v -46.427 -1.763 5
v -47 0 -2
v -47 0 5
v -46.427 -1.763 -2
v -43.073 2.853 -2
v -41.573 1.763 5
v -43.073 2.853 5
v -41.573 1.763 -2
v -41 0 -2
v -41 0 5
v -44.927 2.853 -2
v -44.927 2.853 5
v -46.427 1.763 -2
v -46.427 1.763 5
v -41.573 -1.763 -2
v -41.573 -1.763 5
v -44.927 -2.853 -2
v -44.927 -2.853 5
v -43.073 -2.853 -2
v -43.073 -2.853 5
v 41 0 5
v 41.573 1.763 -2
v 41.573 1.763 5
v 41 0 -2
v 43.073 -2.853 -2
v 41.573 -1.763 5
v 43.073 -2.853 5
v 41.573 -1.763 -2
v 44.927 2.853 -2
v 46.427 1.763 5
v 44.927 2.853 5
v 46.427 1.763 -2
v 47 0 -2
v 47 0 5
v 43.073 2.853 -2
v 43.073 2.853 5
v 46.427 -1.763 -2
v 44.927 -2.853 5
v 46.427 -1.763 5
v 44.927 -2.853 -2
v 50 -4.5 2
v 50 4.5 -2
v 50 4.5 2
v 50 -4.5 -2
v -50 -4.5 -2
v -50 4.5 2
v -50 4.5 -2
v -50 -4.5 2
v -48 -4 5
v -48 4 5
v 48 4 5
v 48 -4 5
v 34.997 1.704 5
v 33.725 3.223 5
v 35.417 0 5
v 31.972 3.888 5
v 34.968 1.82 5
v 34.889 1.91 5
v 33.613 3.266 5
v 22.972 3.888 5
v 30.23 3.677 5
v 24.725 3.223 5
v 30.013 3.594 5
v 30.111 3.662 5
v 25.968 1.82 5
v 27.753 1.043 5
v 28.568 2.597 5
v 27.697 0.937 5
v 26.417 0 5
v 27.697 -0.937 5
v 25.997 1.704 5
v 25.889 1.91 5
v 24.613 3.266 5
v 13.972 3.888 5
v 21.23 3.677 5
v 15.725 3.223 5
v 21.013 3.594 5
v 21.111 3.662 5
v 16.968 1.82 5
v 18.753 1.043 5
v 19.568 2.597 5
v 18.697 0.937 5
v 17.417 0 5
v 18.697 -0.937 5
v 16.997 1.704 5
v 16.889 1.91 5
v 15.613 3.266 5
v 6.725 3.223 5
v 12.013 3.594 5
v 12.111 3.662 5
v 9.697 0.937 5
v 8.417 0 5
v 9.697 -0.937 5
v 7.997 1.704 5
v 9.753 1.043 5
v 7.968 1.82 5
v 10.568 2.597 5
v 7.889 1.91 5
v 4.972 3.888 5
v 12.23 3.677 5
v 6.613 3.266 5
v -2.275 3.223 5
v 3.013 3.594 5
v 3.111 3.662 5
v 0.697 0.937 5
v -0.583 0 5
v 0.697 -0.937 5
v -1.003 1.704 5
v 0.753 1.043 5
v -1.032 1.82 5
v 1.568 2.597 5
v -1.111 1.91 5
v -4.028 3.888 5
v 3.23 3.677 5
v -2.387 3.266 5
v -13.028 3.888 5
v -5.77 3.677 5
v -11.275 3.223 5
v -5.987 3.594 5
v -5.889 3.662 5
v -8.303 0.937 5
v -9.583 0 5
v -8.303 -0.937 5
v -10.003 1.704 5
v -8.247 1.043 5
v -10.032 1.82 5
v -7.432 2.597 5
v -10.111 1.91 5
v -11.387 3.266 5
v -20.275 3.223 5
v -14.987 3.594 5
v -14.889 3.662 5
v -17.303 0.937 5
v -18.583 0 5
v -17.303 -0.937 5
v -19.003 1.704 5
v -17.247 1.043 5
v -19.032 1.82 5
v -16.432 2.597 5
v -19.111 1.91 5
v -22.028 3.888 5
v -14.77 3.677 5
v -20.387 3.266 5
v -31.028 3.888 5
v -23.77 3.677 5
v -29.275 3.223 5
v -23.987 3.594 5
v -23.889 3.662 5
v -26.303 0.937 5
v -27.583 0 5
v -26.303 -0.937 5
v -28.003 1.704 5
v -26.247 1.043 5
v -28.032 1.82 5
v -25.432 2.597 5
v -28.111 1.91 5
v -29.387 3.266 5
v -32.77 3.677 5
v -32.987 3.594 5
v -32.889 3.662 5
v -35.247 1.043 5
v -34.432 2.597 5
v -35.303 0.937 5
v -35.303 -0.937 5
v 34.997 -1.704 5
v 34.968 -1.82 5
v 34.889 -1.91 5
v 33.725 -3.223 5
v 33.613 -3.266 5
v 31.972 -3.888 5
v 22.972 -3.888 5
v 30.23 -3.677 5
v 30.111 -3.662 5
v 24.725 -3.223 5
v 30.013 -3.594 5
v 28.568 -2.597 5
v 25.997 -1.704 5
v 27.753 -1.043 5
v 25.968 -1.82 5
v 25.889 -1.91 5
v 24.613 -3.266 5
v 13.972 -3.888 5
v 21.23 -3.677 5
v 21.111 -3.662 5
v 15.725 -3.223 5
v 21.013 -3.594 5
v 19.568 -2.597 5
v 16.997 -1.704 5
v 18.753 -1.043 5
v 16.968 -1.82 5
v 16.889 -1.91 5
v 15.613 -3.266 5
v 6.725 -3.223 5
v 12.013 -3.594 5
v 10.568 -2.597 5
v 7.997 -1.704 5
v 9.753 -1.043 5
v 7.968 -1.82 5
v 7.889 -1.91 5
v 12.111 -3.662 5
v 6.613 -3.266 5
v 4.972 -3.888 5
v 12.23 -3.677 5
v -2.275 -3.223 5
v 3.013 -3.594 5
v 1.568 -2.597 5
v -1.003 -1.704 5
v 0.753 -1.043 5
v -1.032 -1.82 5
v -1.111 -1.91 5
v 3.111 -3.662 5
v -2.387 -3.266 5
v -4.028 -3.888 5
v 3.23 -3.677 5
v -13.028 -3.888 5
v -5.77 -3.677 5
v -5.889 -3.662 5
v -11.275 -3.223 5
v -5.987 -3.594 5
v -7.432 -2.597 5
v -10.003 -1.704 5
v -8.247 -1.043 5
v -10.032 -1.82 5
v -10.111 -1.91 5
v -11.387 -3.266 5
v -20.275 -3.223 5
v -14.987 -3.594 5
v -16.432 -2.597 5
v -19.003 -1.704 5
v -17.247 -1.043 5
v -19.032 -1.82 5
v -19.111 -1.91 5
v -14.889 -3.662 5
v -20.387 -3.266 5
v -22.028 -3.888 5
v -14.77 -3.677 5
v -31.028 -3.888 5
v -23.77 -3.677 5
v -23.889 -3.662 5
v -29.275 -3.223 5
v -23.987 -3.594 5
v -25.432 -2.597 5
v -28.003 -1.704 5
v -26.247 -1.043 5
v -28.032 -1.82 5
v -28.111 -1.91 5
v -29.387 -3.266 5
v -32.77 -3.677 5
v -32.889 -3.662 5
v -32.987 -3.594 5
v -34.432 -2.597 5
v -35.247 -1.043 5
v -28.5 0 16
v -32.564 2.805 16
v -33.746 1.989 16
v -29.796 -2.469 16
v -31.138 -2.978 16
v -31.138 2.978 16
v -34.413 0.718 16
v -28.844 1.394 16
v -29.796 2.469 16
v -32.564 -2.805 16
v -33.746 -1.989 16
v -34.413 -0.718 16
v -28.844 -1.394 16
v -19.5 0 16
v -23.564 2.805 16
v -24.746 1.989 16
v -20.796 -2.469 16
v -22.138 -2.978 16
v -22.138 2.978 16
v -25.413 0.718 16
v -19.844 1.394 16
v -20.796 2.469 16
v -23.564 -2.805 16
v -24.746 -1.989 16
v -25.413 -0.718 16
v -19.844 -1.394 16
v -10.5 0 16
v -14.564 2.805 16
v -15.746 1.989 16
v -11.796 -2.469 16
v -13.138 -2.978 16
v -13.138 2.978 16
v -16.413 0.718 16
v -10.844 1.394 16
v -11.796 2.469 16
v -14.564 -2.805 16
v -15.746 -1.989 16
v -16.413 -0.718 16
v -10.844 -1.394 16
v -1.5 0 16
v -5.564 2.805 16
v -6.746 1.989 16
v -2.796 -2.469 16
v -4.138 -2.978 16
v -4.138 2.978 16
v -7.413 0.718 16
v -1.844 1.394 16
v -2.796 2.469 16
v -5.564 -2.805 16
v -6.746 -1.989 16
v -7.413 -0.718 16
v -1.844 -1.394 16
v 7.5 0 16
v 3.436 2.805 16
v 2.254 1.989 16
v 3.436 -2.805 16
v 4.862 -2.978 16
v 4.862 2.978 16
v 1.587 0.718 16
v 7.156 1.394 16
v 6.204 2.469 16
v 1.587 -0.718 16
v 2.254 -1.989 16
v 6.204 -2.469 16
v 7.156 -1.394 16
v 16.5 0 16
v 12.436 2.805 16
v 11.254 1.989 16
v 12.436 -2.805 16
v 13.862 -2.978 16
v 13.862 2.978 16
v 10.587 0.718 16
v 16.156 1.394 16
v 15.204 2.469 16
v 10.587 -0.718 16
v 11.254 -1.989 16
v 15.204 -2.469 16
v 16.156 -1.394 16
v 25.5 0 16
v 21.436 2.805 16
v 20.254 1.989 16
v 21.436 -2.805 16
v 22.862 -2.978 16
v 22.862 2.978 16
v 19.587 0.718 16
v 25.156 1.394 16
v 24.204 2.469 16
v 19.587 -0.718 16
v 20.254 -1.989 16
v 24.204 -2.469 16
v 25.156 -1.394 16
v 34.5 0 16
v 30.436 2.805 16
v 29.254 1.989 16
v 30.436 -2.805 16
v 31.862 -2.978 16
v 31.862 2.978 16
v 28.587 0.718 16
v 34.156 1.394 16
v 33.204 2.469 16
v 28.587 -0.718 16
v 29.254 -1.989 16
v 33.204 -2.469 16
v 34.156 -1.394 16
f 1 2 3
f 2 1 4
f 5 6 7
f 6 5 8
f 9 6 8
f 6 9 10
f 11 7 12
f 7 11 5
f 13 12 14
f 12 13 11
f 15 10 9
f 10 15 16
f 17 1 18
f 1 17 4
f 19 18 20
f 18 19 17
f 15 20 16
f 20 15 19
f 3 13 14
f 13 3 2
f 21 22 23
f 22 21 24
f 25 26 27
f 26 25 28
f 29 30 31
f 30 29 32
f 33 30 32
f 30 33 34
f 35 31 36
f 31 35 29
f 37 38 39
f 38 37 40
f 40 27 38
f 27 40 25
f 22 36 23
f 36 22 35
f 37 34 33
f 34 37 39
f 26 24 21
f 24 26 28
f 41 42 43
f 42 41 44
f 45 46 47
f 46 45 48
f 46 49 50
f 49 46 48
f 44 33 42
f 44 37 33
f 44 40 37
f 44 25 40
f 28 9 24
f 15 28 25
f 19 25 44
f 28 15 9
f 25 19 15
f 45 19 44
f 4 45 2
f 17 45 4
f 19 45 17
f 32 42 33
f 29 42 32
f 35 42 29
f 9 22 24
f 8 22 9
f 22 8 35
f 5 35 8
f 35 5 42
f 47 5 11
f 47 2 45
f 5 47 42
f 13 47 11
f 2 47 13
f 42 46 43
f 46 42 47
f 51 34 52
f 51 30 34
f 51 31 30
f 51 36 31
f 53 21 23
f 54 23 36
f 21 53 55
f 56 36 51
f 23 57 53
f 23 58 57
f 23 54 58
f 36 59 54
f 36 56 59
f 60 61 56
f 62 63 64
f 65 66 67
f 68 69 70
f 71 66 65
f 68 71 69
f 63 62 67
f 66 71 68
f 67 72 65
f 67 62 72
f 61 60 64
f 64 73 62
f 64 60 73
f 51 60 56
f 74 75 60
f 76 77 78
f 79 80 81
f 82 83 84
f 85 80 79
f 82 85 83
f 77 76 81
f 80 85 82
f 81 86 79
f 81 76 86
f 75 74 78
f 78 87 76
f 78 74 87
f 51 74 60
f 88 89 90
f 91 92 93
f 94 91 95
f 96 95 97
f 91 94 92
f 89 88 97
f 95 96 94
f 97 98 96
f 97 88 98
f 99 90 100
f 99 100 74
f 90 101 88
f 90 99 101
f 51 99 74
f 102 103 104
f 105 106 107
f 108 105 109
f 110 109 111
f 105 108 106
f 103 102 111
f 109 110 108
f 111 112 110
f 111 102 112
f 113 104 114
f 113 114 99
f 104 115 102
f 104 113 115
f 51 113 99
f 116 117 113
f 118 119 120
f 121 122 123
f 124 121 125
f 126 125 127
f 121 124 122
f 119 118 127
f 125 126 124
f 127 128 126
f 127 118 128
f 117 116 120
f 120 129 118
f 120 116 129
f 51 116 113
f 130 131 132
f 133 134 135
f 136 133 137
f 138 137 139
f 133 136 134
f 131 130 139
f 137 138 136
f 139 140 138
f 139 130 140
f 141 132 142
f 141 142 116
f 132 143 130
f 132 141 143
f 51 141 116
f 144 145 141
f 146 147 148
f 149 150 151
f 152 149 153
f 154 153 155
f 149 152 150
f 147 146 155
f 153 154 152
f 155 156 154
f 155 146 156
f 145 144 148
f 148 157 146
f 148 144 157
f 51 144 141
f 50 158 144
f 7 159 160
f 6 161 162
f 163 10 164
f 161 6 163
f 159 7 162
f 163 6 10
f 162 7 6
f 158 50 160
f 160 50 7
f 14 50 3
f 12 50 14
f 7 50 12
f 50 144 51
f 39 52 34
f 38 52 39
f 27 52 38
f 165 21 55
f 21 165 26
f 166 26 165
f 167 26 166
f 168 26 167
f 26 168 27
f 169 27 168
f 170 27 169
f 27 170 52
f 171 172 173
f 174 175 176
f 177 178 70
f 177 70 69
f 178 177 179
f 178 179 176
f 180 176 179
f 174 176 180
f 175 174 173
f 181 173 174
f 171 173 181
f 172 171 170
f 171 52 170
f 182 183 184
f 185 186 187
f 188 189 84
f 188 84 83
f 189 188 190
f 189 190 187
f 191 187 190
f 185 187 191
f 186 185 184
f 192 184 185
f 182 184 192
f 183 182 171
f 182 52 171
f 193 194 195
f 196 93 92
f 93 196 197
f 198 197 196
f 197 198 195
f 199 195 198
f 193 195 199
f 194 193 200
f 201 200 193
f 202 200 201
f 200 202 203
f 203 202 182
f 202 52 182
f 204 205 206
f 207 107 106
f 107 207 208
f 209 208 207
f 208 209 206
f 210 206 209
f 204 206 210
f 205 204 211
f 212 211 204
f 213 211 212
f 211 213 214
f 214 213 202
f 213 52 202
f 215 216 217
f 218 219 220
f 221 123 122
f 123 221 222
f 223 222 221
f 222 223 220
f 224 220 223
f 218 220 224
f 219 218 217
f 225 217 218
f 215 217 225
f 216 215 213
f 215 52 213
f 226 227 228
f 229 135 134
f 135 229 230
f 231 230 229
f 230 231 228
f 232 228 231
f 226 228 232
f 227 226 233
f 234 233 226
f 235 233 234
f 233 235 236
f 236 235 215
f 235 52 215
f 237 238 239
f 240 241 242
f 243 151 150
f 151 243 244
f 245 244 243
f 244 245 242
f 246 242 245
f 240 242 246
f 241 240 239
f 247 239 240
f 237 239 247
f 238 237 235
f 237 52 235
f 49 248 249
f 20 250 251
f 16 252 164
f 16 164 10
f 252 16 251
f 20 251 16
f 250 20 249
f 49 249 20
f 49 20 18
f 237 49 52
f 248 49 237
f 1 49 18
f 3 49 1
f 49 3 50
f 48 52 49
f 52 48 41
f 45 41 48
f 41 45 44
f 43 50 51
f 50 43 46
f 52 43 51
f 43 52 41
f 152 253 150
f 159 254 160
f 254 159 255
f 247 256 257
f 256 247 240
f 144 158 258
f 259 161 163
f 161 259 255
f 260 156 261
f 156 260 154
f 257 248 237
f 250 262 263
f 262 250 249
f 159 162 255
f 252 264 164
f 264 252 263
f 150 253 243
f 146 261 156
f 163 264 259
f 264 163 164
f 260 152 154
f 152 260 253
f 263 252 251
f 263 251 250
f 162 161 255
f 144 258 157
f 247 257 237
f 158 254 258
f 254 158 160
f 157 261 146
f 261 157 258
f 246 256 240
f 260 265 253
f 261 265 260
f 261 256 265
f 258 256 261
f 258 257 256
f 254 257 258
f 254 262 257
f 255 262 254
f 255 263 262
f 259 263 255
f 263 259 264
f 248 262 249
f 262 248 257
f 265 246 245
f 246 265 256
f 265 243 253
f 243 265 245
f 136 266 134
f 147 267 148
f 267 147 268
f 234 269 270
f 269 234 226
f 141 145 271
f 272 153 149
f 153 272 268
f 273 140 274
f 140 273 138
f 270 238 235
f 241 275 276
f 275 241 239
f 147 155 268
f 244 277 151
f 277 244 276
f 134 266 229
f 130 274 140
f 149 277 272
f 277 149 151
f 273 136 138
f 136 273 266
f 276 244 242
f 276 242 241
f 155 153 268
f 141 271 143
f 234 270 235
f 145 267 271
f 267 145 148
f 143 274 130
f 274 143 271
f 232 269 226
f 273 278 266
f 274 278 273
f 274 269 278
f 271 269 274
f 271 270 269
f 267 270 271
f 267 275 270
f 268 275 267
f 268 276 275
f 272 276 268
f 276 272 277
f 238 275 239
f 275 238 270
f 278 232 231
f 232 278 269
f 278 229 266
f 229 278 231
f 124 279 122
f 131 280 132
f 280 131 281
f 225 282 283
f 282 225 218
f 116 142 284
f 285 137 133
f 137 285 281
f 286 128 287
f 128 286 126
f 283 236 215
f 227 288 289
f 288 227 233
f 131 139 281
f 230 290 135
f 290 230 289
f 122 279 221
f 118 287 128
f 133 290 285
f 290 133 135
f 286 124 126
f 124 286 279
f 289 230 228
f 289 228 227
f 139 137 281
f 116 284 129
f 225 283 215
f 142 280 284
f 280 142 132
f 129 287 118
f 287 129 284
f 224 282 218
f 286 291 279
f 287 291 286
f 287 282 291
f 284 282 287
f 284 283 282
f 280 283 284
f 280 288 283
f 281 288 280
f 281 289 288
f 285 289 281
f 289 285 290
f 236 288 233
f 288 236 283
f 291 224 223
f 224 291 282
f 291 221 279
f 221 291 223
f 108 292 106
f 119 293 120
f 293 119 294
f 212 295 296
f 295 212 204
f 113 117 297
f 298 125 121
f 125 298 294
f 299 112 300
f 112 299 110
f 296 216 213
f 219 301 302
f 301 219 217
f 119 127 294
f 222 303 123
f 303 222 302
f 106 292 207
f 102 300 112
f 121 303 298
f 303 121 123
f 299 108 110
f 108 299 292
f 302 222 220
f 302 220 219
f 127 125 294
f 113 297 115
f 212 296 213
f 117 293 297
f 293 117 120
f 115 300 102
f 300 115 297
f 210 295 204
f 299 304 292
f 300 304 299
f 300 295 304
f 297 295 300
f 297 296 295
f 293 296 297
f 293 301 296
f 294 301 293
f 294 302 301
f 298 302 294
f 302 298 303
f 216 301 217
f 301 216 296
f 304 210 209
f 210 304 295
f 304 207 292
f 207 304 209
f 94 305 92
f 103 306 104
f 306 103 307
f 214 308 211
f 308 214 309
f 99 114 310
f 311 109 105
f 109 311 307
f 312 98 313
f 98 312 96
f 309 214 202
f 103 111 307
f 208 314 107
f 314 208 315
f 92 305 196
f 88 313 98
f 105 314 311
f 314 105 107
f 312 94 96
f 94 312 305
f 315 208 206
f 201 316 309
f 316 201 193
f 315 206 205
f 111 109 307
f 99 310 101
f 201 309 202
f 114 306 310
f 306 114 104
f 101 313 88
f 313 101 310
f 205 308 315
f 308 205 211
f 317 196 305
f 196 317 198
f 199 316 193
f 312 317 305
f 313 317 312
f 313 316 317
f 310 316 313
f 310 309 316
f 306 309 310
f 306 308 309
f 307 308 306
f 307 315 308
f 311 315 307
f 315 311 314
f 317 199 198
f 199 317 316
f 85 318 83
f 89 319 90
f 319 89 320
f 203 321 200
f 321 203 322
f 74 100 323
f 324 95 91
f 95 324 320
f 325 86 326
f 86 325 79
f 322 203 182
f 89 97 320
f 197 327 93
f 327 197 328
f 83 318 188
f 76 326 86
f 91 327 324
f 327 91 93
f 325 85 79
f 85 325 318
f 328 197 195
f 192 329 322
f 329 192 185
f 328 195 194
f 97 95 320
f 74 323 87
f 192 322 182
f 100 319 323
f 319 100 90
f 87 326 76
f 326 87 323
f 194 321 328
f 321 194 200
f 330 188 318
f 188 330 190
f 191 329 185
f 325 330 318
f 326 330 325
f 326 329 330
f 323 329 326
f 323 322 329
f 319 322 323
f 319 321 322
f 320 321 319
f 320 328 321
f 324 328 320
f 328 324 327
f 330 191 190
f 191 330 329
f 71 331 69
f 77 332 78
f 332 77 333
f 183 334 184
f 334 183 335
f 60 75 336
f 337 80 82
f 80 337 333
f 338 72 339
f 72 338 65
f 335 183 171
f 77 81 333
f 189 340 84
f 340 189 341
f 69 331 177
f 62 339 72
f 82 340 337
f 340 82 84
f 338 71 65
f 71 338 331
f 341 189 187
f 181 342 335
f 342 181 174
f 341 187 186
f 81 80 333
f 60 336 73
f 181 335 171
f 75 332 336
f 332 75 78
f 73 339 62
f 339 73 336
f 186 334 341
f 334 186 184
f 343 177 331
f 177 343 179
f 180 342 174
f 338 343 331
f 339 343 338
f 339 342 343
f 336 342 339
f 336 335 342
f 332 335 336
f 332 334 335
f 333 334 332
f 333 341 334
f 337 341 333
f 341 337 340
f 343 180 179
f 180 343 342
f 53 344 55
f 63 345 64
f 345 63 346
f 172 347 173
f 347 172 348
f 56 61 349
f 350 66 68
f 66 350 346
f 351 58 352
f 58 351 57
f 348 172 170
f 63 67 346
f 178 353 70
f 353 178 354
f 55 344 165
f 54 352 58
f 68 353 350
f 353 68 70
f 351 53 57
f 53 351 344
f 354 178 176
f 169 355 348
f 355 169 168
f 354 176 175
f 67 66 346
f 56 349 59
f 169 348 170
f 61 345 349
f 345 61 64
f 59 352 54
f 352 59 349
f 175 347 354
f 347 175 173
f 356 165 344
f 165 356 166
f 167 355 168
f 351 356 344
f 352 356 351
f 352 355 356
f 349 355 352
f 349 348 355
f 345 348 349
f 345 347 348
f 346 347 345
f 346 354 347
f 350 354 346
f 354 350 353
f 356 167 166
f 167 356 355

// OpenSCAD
difference(){
    hull(){
        cube([100,9,4], center=true); 
        translate([0,0,3]) cube([96,8,4], center=true); 
    }
    for(i=[-1,1]) translate([44*i,0,-10]) cylinder(r=3,h=20); 
}

for(i=[-3.5,-2.5,-1.5,-0.5,0.5,1.5,2.5,3.5]){
    translate([9*i,0,4]) cylinder( r1=4,r2=3,h=12 ); 
}
